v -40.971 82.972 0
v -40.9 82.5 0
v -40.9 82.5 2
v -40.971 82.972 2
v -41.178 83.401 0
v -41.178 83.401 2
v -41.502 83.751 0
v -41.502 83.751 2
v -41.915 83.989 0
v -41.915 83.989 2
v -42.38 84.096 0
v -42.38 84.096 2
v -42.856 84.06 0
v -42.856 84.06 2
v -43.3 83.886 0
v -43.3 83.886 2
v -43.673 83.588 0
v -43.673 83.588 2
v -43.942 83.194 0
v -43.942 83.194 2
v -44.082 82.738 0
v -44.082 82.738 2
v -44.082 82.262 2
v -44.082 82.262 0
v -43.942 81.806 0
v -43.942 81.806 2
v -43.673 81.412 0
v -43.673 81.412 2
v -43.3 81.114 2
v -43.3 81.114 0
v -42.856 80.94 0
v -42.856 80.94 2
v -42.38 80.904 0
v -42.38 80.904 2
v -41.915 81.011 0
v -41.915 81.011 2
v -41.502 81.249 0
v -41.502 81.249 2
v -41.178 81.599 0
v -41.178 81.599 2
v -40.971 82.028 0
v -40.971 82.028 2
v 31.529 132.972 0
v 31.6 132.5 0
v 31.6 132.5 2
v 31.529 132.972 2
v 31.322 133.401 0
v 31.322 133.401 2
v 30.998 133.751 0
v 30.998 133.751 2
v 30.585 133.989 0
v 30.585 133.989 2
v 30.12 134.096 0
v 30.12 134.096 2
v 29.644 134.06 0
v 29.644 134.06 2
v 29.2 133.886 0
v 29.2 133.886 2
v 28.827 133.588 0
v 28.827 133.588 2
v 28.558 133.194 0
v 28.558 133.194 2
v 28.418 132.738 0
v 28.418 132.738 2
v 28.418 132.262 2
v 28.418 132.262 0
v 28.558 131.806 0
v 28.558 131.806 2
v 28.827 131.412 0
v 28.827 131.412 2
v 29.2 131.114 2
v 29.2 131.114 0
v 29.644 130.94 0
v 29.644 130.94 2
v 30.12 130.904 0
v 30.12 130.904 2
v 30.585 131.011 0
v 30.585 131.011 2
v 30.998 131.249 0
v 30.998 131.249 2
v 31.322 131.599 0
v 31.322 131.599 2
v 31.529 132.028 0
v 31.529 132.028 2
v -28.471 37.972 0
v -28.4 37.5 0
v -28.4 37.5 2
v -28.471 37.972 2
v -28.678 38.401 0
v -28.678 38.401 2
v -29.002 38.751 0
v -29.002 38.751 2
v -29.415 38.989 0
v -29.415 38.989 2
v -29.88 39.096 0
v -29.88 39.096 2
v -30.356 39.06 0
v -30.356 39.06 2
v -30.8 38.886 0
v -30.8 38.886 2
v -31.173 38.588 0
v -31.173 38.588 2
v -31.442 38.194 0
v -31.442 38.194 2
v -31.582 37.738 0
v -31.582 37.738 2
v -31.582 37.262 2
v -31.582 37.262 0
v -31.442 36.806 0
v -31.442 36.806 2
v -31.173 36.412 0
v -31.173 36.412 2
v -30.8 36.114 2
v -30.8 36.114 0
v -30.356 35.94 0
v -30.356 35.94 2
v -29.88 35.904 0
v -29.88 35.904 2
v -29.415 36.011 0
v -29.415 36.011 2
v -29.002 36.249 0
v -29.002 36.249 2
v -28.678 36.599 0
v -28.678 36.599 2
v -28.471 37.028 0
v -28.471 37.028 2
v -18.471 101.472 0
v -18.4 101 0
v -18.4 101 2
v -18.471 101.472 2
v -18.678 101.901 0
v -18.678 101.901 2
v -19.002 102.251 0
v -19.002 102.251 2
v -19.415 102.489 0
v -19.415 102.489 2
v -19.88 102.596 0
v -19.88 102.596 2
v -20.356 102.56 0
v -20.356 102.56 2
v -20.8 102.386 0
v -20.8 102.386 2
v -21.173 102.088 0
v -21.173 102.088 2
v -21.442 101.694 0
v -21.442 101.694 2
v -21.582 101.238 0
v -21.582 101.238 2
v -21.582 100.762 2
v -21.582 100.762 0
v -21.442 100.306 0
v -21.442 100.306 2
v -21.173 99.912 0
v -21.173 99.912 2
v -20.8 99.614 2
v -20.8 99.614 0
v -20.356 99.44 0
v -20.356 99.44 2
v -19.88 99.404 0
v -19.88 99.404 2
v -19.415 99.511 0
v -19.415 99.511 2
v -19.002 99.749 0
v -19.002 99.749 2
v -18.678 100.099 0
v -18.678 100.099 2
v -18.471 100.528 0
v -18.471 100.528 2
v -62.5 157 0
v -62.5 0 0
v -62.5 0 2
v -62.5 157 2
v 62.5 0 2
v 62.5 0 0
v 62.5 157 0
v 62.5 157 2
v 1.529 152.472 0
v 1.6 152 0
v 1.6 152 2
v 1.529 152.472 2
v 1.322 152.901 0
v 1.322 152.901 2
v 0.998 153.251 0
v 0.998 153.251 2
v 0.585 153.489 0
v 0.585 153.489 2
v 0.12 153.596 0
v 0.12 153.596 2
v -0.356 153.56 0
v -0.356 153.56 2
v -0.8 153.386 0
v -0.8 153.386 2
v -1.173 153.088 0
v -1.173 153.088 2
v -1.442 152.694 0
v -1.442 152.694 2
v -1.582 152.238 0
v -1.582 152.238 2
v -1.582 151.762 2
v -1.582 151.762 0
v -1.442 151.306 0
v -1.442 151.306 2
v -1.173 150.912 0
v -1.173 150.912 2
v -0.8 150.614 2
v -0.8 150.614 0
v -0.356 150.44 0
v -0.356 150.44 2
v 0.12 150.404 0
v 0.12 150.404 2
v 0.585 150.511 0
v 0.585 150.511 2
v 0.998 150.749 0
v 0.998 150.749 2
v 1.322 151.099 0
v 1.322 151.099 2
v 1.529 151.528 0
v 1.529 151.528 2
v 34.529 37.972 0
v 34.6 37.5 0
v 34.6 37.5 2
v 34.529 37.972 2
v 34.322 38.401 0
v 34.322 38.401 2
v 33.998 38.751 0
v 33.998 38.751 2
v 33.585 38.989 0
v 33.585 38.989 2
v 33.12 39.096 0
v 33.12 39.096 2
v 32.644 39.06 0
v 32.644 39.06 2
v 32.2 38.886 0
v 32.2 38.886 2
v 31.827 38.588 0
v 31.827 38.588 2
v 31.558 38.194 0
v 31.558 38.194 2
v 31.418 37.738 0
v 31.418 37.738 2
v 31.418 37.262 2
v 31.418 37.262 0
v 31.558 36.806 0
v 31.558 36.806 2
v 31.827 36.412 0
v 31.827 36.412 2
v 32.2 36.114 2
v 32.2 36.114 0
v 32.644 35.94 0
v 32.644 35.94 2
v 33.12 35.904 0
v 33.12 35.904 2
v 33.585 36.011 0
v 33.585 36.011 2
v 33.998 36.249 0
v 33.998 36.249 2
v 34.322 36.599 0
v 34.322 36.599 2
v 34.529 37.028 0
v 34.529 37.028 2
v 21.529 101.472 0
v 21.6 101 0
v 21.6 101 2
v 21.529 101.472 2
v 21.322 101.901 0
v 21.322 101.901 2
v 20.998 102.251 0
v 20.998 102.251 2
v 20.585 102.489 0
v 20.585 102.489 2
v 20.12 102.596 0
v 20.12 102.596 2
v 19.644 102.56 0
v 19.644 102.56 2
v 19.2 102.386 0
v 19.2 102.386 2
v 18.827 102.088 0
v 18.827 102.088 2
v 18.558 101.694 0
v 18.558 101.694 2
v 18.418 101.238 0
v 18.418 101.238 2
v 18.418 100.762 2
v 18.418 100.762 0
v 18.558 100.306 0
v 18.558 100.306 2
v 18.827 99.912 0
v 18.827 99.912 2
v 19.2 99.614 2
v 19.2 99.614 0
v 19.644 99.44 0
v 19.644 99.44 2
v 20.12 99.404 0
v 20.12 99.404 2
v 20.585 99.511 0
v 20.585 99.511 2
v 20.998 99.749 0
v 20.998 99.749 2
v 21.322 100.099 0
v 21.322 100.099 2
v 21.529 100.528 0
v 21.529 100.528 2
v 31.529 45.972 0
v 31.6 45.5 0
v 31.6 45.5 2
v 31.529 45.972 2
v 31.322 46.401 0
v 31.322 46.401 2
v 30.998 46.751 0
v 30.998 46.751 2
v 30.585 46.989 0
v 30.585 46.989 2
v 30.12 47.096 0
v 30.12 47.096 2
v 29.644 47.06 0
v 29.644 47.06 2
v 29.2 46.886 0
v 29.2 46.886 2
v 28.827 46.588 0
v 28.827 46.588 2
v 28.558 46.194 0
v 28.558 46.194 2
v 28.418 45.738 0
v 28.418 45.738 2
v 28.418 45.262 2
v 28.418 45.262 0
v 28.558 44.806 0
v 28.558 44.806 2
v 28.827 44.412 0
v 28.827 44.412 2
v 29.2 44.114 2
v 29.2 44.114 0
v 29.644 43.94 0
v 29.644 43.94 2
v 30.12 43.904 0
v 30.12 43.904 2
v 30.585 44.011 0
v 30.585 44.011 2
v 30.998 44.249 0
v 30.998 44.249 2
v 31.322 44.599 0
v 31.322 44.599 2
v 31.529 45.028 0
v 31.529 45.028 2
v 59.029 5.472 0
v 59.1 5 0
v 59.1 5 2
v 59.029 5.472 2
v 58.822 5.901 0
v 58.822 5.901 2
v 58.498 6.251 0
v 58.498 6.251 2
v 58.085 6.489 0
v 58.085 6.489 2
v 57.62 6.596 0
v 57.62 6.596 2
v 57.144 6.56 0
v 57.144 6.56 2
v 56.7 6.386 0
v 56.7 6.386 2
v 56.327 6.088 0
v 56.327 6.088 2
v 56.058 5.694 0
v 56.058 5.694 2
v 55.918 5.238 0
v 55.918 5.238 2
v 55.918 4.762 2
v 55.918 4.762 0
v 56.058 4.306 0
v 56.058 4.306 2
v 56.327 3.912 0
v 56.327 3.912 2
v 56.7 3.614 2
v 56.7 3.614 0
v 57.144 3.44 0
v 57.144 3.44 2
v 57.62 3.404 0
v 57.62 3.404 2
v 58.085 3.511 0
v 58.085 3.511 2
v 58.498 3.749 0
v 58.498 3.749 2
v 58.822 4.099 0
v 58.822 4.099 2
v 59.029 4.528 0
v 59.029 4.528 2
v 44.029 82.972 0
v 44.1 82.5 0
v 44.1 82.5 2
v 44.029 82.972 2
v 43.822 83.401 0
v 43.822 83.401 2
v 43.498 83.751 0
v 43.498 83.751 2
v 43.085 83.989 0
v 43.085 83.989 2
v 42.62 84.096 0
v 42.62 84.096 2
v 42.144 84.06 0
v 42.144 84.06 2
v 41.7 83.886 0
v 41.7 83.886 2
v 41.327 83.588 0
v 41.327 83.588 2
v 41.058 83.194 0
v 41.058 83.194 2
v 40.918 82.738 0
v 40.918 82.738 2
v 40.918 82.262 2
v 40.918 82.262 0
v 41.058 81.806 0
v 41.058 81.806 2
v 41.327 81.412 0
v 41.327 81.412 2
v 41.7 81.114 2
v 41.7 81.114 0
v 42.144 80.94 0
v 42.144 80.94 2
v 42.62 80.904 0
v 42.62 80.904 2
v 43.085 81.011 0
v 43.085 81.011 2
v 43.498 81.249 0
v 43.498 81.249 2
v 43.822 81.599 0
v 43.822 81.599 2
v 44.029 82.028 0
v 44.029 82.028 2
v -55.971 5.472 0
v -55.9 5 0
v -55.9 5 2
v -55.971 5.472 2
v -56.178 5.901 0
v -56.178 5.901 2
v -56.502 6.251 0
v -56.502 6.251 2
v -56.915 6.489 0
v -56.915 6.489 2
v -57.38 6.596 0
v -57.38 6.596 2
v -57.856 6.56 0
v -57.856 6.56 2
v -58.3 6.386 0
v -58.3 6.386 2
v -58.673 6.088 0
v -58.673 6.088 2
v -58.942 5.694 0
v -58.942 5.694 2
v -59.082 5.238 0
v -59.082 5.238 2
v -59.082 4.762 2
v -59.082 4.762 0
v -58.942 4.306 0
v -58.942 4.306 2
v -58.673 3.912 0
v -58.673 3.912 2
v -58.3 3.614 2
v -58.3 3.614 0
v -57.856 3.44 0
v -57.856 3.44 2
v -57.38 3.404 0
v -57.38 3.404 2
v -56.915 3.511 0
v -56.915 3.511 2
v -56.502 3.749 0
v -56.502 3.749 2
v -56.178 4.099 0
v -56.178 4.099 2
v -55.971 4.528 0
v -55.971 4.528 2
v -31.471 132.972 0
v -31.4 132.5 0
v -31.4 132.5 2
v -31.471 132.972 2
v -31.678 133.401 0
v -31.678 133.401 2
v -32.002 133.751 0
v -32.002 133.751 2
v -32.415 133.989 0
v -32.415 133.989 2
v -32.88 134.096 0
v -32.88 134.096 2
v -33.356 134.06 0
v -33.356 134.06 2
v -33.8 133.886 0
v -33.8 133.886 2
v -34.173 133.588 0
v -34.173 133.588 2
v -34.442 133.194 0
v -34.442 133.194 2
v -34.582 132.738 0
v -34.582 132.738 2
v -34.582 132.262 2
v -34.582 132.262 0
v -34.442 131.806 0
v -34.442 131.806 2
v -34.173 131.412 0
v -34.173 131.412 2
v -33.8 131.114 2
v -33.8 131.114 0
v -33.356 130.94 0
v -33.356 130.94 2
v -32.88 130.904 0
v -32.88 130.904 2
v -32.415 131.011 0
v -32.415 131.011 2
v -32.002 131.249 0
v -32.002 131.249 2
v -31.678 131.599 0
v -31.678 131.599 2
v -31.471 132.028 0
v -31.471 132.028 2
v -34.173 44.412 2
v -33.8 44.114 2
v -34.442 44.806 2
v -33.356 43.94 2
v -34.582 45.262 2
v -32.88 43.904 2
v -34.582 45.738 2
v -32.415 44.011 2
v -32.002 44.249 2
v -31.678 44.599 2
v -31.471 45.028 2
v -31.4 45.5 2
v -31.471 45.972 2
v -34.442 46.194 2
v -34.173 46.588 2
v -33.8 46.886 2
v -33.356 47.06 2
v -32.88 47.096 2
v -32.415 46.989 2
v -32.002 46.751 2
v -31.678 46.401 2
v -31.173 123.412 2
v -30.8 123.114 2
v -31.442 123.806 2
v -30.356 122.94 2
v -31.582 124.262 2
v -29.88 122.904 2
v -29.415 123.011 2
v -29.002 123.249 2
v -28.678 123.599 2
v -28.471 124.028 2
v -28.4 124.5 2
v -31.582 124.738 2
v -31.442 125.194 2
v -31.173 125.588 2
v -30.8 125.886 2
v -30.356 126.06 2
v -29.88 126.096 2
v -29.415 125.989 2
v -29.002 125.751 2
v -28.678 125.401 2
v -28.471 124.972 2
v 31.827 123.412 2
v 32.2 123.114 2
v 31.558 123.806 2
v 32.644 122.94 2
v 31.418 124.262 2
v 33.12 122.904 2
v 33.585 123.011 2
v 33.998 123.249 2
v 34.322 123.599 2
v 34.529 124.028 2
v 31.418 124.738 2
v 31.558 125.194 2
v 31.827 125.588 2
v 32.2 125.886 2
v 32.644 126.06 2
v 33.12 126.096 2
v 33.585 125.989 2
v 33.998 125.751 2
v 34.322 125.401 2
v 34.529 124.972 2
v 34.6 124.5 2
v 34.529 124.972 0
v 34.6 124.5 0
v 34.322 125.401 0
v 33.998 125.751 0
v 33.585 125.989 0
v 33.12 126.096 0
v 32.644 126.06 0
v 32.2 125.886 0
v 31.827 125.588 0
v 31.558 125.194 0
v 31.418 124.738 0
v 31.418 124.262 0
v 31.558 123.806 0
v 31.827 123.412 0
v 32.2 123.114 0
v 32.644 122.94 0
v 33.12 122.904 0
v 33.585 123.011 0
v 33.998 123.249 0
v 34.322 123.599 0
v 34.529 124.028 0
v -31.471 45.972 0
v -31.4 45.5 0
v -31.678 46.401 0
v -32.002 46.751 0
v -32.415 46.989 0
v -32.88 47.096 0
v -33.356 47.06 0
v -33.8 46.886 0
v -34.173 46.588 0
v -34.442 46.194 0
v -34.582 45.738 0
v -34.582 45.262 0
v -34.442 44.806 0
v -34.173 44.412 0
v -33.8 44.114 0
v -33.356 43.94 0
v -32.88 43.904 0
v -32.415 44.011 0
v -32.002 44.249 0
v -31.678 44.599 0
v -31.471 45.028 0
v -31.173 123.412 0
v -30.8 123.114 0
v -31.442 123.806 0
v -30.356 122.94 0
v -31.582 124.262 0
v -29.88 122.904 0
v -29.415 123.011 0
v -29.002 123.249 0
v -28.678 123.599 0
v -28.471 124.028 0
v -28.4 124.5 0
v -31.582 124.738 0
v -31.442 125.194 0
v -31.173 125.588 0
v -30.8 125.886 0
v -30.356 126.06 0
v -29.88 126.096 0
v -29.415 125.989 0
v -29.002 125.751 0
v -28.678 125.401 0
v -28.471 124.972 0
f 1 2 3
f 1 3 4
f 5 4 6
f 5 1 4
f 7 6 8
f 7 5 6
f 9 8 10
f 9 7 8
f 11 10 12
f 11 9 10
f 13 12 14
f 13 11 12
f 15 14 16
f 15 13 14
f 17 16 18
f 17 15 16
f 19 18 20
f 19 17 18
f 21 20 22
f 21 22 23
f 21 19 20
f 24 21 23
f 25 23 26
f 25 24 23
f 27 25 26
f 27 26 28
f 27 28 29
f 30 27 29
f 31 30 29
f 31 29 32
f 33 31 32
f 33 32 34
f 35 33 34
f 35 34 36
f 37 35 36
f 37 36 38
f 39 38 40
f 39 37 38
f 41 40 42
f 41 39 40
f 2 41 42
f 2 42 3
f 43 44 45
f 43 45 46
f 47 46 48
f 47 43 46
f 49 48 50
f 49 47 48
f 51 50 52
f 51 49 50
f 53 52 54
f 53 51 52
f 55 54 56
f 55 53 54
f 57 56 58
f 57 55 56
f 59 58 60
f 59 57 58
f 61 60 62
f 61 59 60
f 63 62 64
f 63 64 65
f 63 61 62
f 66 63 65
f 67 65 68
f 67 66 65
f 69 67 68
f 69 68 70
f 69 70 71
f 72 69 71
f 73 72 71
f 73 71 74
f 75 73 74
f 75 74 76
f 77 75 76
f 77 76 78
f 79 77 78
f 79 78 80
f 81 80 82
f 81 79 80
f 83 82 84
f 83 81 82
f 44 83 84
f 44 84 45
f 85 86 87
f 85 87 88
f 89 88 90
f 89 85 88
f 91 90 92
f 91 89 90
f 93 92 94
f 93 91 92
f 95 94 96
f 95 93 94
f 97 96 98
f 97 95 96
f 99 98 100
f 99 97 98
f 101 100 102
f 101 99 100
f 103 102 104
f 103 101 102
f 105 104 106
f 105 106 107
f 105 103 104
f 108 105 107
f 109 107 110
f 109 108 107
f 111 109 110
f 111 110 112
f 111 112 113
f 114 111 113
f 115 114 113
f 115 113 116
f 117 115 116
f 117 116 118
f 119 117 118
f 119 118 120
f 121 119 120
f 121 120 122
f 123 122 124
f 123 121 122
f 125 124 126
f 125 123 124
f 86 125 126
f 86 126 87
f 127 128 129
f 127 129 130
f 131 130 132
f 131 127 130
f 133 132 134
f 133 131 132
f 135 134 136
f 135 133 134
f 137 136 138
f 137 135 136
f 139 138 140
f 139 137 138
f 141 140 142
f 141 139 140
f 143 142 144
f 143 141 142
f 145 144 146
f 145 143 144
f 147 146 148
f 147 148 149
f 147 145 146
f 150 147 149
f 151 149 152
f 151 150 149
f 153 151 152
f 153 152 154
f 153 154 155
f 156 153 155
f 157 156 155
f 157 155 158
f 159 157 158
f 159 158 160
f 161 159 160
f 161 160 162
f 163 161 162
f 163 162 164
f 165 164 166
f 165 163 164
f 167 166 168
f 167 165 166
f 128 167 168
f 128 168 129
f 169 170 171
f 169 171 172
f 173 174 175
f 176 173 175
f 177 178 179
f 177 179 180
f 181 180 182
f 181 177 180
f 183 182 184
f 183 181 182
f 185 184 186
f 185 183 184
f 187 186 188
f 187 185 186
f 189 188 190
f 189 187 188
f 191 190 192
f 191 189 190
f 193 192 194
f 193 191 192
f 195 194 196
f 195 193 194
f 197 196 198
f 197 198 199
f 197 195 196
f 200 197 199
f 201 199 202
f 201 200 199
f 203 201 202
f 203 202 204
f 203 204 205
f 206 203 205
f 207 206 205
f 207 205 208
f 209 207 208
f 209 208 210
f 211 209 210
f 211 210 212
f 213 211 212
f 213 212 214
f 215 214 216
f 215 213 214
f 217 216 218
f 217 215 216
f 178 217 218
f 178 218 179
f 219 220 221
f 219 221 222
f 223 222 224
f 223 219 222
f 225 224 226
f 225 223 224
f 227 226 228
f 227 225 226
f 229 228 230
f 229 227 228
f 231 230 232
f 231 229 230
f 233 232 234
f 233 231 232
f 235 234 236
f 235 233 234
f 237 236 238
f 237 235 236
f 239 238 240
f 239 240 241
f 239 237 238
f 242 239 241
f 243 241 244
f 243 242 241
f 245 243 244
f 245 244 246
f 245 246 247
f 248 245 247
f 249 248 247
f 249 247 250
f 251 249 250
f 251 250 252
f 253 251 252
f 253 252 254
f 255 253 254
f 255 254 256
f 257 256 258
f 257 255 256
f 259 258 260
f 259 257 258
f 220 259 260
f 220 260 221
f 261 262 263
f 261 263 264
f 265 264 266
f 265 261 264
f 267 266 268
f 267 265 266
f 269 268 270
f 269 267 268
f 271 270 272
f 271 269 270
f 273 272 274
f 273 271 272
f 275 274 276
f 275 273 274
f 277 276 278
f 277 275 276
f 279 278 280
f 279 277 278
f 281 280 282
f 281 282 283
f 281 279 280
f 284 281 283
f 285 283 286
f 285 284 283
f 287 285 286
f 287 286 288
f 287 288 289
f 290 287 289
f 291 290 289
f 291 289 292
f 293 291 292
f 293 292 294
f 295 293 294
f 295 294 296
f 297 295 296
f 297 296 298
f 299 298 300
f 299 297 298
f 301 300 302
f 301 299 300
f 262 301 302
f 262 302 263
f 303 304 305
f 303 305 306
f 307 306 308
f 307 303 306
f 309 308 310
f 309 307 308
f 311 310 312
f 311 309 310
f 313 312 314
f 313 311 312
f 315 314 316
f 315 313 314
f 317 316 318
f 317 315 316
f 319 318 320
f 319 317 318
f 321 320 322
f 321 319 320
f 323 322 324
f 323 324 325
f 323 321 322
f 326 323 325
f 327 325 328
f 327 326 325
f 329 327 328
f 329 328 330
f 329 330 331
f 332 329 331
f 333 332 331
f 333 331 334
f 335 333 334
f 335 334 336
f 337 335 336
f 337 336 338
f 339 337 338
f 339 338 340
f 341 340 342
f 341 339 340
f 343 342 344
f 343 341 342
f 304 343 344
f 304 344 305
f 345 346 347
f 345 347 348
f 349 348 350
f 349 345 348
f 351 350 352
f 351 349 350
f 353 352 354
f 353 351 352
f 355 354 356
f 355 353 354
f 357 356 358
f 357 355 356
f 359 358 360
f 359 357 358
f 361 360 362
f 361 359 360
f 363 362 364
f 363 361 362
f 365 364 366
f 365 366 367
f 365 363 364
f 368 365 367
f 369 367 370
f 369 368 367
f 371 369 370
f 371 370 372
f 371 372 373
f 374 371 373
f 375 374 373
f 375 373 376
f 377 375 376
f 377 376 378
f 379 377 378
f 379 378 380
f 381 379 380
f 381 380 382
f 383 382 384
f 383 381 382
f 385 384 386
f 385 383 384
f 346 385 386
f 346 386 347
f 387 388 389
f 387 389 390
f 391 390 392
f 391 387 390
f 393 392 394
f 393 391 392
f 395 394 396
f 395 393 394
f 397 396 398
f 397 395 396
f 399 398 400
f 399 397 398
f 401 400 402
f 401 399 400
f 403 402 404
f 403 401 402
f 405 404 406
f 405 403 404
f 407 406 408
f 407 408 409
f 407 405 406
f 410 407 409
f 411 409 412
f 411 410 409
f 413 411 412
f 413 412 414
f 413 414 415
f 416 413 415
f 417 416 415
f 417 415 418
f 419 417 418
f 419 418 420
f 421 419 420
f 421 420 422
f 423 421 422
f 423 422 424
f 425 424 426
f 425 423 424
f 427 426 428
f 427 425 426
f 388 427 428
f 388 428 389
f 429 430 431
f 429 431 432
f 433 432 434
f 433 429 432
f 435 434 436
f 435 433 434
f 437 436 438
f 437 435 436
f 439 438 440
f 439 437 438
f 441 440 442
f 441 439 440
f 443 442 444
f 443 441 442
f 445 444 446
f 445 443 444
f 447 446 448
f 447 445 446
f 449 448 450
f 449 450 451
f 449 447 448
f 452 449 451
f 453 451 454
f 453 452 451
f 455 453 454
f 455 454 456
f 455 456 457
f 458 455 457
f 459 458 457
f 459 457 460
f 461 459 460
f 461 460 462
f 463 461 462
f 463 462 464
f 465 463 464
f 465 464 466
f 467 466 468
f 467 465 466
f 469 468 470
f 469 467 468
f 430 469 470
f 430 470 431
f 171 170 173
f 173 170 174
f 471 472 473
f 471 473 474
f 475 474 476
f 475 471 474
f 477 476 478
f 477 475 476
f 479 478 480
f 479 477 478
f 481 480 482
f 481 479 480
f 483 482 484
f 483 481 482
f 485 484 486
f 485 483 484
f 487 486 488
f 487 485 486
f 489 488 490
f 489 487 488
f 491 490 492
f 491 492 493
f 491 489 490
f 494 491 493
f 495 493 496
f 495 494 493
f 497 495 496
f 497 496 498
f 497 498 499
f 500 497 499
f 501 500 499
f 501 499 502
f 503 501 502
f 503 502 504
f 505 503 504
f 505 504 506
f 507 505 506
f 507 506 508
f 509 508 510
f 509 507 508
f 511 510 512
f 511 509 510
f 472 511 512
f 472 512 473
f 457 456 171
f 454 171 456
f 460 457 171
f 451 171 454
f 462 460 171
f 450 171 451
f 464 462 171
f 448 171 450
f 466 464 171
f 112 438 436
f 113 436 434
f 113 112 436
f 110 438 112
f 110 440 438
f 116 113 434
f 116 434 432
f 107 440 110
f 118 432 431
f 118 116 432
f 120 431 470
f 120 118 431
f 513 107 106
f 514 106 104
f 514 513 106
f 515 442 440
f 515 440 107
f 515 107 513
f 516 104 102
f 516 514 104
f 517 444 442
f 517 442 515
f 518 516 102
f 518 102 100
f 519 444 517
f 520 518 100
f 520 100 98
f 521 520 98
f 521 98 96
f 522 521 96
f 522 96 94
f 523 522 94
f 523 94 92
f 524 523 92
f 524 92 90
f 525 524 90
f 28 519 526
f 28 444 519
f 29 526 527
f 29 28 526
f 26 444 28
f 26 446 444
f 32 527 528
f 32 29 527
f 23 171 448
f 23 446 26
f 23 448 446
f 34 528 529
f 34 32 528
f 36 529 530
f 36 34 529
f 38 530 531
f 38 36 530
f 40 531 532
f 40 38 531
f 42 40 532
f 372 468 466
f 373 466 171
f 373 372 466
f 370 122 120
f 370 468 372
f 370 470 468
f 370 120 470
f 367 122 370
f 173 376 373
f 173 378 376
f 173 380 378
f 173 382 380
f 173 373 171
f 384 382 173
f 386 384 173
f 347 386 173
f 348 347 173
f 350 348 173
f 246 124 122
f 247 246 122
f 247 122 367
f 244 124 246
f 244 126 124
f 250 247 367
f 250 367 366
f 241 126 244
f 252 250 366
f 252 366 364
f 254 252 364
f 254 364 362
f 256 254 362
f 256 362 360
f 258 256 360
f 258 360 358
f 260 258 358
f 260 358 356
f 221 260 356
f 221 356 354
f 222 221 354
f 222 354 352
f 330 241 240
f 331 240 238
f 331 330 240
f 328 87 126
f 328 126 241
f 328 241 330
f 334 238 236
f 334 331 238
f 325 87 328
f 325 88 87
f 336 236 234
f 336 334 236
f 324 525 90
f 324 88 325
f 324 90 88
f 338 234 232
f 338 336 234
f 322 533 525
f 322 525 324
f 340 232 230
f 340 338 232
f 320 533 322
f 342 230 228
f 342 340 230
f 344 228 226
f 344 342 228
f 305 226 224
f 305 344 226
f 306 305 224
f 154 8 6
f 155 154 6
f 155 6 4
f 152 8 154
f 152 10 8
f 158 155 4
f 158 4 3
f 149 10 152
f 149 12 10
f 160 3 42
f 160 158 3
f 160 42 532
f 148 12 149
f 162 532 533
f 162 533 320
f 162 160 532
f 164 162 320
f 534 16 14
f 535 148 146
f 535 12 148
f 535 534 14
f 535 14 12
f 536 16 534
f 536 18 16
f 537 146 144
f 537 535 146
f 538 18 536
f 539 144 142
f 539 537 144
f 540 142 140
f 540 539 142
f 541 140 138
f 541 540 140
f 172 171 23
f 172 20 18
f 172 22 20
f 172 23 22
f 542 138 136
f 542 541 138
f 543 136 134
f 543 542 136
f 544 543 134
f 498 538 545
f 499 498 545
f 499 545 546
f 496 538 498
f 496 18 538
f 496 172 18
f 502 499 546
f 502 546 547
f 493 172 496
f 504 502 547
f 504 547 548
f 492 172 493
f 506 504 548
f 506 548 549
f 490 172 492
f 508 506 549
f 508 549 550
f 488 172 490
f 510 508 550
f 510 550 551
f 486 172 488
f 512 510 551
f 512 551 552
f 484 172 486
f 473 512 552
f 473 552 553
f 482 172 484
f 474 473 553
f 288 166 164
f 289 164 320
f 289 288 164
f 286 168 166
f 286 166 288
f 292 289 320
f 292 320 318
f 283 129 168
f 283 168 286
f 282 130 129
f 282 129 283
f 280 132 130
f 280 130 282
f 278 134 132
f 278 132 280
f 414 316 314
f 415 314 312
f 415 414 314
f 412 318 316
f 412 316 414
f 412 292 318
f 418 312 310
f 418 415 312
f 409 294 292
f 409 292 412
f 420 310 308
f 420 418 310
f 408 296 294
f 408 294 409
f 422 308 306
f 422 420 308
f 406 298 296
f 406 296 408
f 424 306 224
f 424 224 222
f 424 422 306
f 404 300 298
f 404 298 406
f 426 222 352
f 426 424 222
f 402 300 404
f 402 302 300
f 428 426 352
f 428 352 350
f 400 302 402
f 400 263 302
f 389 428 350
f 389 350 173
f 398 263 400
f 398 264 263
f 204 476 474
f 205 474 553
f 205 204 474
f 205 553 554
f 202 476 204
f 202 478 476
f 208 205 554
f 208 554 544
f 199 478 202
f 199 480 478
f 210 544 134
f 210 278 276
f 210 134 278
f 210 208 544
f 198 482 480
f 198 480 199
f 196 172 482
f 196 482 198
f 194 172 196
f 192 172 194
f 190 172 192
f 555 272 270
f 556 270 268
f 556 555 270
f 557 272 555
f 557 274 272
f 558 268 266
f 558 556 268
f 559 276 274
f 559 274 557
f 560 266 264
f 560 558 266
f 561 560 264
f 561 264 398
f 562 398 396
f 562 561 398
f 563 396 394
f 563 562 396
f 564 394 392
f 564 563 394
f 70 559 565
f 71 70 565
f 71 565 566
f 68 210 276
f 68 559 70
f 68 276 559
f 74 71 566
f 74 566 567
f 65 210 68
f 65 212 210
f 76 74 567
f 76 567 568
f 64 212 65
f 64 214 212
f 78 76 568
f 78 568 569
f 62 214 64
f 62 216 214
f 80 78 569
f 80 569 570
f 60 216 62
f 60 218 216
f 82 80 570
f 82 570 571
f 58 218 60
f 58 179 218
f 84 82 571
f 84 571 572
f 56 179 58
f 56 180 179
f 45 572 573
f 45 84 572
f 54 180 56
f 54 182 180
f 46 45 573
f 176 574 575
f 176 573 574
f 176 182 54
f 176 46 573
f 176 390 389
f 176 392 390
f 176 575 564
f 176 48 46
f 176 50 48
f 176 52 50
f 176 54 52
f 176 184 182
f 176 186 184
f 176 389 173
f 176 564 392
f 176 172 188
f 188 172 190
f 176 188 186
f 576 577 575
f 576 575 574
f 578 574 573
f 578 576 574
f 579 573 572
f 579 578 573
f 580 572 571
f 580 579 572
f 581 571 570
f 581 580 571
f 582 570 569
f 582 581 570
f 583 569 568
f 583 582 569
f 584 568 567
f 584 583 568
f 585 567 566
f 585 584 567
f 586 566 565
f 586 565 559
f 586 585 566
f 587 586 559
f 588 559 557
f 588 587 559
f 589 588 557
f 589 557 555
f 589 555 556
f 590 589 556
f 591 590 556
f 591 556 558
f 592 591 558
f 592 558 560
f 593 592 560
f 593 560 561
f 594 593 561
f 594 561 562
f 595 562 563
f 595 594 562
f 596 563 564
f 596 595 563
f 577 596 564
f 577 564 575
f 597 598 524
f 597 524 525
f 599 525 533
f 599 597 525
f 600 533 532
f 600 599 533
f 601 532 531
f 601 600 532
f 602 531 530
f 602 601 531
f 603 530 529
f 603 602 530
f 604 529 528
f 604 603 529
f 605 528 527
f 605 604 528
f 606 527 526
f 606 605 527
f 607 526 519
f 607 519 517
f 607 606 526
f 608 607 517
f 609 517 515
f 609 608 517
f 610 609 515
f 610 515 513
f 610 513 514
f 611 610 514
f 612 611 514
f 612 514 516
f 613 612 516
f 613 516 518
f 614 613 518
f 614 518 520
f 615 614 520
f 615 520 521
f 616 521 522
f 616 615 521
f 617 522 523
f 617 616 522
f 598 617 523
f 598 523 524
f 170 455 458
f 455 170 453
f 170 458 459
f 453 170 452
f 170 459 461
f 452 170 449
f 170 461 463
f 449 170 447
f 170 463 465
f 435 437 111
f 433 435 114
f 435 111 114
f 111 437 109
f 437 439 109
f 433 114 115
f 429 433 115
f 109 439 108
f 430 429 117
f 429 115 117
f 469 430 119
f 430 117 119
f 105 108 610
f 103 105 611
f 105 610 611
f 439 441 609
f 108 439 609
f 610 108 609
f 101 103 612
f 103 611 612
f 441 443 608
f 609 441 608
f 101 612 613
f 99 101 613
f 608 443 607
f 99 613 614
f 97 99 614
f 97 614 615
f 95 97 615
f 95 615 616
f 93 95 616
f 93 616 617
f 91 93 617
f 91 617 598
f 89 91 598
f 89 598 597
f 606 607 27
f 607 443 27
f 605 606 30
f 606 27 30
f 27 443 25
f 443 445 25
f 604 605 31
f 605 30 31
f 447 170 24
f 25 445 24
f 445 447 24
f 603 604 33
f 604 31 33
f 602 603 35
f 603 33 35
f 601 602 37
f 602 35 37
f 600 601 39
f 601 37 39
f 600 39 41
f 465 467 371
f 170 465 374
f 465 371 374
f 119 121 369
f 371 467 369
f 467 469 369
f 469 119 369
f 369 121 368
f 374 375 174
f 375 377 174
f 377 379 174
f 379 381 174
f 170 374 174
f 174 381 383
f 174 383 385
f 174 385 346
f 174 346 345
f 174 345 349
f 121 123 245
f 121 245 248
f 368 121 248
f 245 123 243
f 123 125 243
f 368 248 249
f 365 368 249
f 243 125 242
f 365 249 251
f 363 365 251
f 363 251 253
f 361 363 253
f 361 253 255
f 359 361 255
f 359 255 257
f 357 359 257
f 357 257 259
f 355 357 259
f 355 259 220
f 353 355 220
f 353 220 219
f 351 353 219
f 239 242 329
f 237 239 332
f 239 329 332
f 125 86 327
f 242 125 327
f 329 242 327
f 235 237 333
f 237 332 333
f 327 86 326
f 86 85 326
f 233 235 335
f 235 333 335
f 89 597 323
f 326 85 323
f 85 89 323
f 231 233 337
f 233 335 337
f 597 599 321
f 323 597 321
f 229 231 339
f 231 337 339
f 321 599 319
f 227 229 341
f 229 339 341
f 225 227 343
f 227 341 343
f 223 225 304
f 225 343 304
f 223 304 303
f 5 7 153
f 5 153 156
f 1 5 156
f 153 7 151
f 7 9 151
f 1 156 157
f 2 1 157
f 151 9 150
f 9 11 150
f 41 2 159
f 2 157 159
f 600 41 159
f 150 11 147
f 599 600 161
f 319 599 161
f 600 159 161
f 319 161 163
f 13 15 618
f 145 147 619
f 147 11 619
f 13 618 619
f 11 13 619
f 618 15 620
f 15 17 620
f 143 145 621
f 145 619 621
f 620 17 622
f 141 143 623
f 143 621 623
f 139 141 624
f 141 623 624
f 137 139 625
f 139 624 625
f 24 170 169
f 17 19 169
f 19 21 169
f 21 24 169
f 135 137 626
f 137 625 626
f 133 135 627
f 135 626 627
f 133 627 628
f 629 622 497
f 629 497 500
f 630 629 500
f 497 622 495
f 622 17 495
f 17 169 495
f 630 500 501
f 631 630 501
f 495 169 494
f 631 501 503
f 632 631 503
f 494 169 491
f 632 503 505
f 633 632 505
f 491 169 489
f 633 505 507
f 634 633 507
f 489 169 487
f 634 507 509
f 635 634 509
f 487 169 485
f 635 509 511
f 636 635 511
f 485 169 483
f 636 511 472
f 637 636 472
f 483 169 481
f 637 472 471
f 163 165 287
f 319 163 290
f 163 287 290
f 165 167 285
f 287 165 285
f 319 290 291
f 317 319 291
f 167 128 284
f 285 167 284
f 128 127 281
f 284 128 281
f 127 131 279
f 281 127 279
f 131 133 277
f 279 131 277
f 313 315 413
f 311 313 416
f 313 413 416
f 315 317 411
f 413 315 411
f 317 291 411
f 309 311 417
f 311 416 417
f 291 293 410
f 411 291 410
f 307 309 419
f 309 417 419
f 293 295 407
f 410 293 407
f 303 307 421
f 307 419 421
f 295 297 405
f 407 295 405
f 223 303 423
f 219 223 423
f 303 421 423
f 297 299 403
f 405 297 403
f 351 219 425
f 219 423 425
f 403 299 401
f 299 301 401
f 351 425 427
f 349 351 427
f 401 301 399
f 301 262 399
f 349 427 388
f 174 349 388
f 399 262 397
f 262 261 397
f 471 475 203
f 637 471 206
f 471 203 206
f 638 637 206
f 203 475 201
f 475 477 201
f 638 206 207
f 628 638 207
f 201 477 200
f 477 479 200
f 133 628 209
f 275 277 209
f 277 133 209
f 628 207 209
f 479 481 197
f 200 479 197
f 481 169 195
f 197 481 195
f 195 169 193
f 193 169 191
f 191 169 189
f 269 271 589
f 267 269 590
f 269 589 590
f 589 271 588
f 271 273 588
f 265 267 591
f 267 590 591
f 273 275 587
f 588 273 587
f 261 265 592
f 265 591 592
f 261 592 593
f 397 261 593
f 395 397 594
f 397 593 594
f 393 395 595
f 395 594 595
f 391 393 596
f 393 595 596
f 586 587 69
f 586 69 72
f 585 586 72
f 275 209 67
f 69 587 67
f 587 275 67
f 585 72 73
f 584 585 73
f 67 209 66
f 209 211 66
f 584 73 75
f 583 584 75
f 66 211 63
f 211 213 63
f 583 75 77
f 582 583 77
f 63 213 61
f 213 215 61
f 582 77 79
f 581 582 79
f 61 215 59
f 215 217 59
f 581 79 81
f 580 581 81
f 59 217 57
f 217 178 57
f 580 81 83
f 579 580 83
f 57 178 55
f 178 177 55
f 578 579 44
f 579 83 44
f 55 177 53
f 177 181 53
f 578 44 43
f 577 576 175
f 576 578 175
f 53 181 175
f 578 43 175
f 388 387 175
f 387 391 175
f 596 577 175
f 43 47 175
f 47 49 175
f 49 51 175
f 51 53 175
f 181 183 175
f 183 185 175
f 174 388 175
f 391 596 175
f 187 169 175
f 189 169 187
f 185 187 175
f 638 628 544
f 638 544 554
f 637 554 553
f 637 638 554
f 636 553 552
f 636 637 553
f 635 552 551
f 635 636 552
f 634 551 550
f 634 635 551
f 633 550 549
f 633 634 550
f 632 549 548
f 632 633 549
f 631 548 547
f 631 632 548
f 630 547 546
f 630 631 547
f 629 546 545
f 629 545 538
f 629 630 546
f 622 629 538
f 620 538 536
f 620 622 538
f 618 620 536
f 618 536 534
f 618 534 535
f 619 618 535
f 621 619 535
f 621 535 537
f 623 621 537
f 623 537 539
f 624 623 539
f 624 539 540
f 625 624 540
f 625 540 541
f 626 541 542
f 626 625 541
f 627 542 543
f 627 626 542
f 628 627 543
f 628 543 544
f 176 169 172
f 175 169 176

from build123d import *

# Parameters (mm, degrees)
SKETCH_1_W      = 125
SKETCH_1_H      = 157
SKETCH_1_R      = 1.6
SKETCH_1_W_2    = 10
SKETCH_1_H_2    = 15
EXTRUDE_1_DEPTH = 2


with BuildPart() as part:
    # 草圖1 → 填料-伸長1 (new body)
    # profile 1 of 5: a face of its own
    with BuildSketch(Plane.XY):
        with Locations((0, 78.5)):
            Rectangle(SKETCH_1_W, SKETCH_1_H)
        with Locations((-42.5, 82.5)):
            Circle(SKETCH_1_R, mode=Mode.SUBTRACT)
        with Locations((42.5, 82.5)):
            Circle(SKETCH_1_R, mode=Mode.SUBTRACT)
        with Locations((0, 152)):
            Circle(SKETCH_1_R, mode=Mode.SUBTRACT)
        with Locations((20, 101)):
            Circle(SKETCH_1_R, mode=Mode.SUBTRACT)
        with Locations((-20, 101)):
            Circle(SKETCH_1_R, mode=Mode.SUBTRACT)
        with Locations((57.5, 5)):
            Circle(SKETCH_1_R, mode=Mode.SUBTRACT)
        with Locations((-57.5, 5)):
            Circle(SKETCH_1_R, mode=Mode.SUBTRACT)
        with Locations((-31.5, 128.5)):
            Rectangle(SKETCH_1_W_2, SKETCH_1_H_2, mode=Mode.SUBTRACT)
        with Locations((31.5, 41.5)):
            Rectangle(SKETCH_1_W_2, SKETCH_1_H_2, mode=Mode.SUBTRACT)
        with Locations((-31.5, 41.5)):
            Rectangle(SKETCH_1_W_2, SKETCH_1_H_2, mode=Mode.SUBTRACT)
        with Locations((31.5, 128.5)):
            Rectangle(SKETCH_1_W_2, SKETCH_1_H_2, mode=Mode.SUBTRACT)
    # profile 2 of 5: a face of its own
    with BuildSketch(Plane.XY):
        with Locations((31.5, 128.5)):
            Rectangle(SKETCH_1_W_2, SKETCH_1_H_2)
        with Locations((30, 132.5)):
            Circle(SKETCH_1_R, mode=Mode.SUBTRACT)
        with Locations((33, 124.5)):
            Circle(SKETCH_1_R, mode=Mode.SUBTRACT)
    # profile 3 of 5: a face of its own
    with BuildSketch(Plane.XY):
        with Locations((-31.5, 128.5)):
            Rectangle(SKETCH_1_W_2, SKETCH_1_H_2)
        with Locations((-30, 124.5)):
            Circle(SKETCH_1_R, mode=Mode.SUBTRACT)
        with Locations((-33, 132.5)):
            Circle(SKETCH_1_R, mode=Mode.SUBTRACT)
    # profile 4 of 5: a face of its own
    with BuildSketch(Plane.XY):
        with Locations((-31.5, 41.5)):
            Rectangle(SKETCH_1_W_2, SKETCH_1_H_2)
        with Locations((-30, 37.5)):
            Circle(SKETCH_1_R, mode=Mode.SUBTRACT)
        with Locations((-33, 45.5)):
            Circle(SKETCH_1_R, mode=Mode.SUBTRACT)
    # profile 5 of 5: a face of its own
    with BuildSketch(Plane.XY):
        with Locations((31.5, 41.5)):
            Rectangle(SKETCH_1_W_2, SKETCH_1_H_2)
        with Locations((33, 37.5)):
            Circle(SKETCH_1_R, mode=Mode.SUBTRACT)
        with Locations((30, 45.5)):
            Circle(SKETCH_1_R, mode=Mode.SUBTRACT)
    extrude(amount=EXTRUDE_1_DEPTH)


solid = part.part
